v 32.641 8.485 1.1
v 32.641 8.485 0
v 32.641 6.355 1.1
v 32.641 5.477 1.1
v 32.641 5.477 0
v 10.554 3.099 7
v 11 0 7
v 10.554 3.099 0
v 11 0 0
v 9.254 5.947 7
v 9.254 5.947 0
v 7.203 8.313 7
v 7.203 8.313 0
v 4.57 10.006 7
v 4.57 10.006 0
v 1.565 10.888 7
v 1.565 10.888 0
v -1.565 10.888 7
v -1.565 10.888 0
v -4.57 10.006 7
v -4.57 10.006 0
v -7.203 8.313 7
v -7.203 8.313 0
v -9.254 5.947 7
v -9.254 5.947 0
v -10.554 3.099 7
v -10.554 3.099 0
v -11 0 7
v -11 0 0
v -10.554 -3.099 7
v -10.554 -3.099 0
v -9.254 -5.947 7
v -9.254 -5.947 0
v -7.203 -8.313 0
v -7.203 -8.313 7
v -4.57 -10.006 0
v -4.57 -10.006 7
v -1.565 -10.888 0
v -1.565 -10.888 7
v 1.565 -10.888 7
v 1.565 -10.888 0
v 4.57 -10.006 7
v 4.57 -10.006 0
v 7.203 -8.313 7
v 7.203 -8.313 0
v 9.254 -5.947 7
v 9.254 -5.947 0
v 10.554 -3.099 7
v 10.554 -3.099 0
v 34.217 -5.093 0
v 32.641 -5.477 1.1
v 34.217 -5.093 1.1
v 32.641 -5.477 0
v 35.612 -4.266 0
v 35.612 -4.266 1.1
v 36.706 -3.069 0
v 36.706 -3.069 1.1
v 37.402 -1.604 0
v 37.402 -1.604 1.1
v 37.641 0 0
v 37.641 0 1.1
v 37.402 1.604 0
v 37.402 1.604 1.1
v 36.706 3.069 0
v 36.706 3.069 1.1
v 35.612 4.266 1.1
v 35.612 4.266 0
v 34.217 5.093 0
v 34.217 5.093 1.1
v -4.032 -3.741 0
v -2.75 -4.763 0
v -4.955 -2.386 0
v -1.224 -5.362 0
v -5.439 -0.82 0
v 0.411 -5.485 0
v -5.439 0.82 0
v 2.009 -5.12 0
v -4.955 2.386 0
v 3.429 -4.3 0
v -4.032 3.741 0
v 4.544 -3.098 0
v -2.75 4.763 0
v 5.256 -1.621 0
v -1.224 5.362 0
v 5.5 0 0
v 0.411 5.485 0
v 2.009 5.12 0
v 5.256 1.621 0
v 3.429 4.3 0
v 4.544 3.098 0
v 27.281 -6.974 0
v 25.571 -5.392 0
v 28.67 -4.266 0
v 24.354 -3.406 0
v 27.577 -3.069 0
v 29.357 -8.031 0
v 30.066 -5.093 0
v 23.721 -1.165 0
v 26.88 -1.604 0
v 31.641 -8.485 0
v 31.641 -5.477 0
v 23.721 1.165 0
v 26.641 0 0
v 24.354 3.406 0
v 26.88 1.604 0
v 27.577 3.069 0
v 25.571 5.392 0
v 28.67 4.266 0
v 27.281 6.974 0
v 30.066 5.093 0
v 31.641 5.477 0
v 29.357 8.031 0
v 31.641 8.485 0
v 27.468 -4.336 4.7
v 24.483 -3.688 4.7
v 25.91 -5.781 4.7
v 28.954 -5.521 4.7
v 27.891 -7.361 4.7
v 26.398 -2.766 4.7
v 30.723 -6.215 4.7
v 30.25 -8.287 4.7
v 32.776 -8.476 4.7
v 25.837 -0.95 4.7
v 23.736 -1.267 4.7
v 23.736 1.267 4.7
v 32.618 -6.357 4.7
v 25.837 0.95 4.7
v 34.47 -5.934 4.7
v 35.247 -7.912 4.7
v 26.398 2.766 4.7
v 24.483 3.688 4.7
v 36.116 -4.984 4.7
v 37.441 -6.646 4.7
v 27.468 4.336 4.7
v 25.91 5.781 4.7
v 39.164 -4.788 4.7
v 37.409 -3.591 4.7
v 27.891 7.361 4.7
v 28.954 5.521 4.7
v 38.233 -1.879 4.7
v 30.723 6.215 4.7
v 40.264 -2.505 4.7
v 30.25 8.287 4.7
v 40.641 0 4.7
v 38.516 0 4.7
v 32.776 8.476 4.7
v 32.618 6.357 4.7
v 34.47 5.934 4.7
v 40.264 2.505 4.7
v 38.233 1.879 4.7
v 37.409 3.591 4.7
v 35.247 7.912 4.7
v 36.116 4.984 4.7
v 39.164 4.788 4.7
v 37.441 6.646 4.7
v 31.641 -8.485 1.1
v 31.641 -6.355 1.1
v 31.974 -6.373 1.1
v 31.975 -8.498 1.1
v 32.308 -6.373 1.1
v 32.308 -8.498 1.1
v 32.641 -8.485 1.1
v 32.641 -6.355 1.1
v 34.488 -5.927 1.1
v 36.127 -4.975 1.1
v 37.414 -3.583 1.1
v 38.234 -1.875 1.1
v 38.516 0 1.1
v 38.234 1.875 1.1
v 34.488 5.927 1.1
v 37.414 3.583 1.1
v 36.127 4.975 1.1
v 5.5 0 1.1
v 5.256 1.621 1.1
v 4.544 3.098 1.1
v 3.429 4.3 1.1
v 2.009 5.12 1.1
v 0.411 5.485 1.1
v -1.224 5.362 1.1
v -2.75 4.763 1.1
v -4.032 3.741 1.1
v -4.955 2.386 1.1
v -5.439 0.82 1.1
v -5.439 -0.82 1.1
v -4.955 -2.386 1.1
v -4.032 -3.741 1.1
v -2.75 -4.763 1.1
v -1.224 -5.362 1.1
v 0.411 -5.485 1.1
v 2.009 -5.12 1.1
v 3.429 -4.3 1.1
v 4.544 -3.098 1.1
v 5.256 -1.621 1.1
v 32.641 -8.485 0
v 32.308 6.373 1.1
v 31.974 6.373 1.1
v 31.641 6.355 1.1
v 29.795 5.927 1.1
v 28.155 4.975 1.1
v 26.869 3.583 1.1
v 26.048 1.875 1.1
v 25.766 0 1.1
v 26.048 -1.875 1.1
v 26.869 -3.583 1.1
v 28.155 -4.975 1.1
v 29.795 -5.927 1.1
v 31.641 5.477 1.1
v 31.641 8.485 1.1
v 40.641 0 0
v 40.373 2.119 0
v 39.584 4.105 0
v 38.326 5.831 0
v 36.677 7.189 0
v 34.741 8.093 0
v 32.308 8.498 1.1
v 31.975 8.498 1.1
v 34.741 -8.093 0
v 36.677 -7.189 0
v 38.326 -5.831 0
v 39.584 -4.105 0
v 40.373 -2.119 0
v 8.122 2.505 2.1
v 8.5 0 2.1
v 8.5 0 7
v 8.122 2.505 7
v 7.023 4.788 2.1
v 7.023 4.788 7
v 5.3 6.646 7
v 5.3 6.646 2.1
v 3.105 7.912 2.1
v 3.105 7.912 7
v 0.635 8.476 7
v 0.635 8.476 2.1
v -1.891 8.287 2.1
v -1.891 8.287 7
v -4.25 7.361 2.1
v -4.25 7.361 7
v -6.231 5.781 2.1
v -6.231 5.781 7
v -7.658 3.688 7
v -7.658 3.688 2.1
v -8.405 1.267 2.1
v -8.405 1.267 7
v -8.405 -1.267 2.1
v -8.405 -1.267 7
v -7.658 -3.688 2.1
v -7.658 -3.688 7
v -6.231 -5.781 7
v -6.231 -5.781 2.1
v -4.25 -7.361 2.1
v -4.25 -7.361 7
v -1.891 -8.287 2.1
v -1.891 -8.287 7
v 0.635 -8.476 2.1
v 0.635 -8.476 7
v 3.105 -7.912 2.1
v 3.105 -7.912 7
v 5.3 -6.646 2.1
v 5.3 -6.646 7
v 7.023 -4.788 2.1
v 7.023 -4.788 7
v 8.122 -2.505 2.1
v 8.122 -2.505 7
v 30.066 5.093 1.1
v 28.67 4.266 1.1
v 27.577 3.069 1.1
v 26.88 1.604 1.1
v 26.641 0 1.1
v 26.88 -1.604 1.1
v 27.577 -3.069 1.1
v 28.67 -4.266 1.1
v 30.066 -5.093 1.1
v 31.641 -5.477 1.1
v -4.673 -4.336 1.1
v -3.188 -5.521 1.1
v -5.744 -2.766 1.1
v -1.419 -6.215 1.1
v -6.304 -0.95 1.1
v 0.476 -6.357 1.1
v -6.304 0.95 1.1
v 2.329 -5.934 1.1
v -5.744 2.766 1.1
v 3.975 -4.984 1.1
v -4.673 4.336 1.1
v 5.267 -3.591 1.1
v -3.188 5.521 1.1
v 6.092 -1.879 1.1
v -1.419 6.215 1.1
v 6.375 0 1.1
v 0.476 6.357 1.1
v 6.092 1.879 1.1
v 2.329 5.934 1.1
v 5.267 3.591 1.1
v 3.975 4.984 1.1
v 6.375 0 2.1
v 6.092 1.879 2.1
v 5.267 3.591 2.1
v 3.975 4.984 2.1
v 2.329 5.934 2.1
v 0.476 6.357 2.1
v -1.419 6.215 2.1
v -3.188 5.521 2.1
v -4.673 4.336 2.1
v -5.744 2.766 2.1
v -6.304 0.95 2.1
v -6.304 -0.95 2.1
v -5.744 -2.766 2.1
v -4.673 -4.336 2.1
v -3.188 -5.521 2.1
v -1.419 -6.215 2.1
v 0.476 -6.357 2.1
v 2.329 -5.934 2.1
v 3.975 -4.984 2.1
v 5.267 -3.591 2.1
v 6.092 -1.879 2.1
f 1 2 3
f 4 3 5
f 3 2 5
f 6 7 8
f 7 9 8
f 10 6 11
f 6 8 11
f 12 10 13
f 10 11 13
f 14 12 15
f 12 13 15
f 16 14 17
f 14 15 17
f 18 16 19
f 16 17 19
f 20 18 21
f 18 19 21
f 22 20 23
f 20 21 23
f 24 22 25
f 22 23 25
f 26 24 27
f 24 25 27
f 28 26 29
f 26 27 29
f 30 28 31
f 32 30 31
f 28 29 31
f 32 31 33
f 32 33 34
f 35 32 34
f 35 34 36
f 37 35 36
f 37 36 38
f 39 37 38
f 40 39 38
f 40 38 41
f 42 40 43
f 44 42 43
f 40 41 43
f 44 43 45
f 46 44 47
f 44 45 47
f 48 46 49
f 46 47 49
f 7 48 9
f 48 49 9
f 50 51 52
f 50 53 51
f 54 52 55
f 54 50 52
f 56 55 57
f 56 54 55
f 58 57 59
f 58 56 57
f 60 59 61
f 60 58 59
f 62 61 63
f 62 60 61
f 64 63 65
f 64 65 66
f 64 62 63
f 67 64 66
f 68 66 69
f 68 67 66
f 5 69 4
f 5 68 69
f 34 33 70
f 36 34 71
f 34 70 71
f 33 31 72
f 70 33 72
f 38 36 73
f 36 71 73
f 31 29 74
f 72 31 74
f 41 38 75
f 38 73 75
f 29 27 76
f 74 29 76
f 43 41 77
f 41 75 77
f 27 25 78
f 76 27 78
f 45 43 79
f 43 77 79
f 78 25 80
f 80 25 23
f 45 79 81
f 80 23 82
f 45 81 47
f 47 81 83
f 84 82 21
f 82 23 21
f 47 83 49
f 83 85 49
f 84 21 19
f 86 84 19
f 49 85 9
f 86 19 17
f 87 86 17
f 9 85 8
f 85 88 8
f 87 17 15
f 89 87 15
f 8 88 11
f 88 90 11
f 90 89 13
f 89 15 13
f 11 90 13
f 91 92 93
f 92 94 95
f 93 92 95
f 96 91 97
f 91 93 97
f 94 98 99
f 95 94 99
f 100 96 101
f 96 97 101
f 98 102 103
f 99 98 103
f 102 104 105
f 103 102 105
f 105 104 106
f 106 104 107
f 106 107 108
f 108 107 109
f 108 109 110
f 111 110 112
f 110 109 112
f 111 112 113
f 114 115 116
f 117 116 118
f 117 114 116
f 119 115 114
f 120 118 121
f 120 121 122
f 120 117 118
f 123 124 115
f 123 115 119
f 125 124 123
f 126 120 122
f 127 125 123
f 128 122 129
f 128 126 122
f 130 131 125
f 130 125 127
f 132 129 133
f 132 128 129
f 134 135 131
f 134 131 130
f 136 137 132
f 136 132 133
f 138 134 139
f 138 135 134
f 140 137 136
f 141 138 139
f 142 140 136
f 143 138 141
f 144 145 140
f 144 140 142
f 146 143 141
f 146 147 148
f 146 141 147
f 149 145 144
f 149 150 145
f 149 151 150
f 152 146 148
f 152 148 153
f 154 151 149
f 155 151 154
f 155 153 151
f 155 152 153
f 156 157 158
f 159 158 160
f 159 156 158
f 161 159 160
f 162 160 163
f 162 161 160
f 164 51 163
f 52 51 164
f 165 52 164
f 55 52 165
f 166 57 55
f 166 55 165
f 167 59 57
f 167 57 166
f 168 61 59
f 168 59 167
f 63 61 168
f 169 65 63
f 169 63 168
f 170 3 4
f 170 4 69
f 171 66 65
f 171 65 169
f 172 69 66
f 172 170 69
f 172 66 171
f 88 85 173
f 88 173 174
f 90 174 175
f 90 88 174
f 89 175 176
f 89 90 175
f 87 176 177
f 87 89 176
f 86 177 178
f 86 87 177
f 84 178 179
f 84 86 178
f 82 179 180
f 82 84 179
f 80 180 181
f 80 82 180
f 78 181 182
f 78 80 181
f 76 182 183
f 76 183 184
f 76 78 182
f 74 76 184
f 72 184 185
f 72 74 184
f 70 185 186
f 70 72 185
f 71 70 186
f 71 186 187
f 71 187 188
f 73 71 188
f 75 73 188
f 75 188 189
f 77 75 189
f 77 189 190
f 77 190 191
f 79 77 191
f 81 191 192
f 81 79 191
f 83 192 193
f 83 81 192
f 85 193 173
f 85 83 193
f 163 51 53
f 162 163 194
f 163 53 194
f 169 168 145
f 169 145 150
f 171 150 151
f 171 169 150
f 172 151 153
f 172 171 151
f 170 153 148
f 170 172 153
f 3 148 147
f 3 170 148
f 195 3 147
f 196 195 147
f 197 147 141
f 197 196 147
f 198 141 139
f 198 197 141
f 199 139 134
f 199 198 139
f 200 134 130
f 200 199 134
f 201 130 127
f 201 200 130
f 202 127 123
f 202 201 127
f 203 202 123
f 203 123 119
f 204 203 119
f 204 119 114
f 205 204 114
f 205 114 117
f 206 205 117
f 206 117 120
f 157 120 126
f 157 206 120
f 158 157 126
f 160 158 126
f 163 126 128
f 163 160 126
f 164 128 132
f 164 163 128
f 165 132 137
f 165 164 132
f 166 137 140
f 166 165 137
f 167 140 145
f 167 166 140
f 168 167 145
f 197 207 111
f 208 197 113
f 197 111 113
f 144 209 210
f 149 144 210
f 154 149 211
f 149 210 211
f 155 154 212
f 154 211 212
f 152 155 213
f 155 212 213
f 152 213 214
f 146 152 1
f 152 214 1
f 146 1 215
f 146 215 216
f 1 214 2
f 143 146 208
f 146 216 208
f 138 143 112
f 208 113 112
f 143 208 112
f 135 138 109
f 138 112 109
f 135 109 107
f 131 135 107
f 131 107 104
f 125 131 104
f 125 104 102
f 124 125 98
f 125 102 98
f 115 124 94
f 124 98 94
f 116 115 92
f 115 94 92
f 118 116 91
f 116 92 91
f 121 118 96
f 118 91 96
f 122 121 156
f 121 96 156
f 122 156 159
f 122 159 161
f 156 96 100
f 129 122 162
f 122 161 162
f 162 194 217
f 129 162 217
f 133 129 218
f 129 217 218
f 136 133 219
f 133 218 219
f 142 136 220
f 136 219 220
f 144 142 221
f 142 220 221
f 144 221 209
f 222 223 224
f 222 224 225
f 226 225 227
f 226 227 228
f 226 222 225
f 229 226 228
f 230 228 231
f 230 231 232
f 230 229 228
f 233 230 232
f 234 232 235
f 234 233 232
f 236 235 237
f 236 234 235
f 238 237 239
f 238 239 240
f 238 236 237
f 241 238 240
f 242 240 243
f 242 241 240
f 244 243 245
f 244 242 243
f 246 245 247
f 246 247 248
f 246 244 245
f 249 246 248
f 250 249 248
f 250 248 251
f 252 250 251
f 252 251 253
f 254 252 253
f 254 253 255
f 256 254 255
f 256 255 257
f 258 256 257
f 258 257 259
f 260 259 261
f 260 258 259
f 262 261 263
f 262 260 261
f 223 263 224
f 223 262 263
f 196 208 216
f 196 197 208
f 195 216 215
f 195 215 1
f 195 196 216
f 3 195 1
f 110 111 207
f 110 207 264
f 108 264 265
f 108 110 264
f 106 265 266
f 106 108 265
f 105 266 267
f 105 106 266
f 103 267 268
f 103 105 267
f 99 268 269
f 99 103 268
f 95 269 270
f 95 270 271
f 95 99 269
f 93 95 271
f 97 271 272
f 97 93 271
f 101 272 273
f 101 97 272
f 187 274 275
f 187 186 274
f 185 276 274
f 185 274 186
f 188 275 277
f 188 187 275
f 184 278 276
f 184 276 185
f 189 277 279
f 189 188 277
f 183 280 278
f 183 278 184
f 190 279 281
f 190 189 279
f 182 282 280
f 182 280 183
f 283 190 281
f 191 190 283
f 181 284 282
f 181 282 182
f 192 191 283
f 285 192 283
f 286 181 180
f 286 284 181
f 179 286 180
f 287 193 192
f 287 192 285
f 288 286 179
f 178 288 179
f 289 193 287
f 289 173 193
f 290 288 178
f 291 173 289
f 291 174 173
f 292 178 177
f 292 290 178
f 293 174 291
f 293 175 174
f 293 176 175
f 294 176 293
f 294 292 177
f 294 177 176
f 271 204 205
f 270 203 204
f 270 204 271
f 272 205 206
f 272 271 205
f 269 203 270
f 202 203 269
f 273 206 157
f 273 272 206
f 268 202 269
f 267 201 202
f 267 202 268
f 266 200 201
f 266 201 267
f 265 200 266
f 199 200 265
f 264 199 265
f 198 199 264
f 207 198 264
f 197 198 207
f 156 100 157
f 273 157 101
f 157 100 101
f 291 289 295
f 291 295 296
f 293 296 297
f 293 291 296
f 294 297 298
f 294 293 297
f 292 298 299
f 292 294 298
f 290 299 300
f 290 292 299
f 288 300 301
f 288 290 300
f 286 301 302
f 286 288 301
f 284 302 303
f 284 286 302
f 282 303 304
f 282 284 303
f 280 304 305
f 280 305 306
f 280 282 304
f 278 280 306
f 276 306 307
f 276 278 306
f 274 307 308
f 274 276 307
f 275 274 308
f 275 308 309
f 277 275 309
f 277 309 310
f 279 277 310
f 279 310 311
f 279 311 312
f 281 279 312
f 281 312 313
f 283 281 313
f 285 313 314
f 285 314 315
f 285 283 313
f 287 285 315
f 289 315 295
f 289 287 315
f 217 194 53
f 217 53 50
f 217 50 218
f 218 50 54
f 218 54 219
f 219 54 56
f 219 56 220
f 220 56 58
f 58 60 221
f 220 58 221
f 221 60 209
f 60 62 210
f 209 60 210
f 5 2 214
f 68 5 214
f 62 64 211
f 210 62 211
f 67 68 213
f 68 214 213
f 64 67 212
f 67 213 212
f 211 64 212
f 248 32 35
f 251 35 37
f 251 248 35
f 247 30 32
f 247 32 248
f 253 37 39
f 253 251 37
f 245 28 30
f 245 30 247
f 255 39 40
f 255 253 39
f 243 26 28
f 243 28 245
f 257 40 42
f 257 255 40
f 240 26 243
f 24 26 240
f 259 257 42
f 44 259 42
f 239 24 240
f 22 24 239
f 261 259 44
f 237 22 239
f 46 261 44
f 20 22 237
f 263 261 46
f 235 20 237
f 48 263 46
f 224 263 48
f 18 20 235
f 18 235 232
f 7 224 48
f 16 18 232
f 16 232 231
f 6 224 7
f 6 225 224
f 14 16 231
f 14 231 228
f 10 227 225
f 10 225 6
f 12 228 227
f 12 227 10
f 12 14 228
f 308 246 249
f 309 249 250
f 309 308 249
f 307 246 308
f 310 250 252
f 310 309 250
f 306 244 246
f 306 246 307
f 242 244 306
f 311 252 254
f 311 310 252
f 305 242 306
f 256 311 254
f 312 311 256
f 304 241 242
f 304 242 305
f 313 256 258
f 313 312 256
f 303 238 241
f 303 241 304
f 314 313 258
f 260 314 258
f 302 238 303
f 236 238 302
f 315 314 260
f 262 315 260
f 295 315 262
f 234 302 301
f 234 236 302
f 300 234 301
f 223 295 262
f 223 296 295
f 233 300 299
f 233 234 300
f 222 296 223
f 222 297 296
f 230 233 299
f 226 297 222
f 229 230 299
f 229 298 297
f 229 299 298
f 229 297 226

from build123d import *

# Parameters (mm, degrees)
F0_R      = 11
F0_R_2    = 5.5
F1_DEPTH  = 1.1
F2_R      = 11
F2_R_2    = 6.375
F3_DEPTH  = 1
F4_R      = 11
F4_R_2    = 8.5
F5_DEPTH  = 4.9
F6_R      = 8.5
F6_R_2    = 5.5
F7_DEPTH  = 1.1
F8_R      = 8.5
F8_R_2    = 6.375
F9_DEPTH  = 3.6
F11_DEPTH = 1.1


with BuildPart() as f1:
    # F0 (on Top) → F1 (new body)
    with BuildSketch(Plane.XY):
        Circle(F0_R)
        Circle(F0_R_2, mode=Mode.SUBTRACT)
    extrude(amount=F1_DEPTH)

    # F2 (on face) → F3 (join)
    with BuildSketch(Plane.XY.offset(1.1)):
        Circle(F2_R)
        Circle(F2_R_2, mode=Mode.SUBTRACT)
    extrude(amount=F3_DEPTH)

    # F4 (on face) → F5 (join)
    with BuildSketch(Plane.XY.offset(2.1)):
        Circle(F4_R)
        Circle(F4_R_2, mode=Mode.SUBTRACT)
    extrude(amount=F5_DEPTH)


with BuildPart() as f7:
    # F6 (on Top) → F7 (new body)
    with BuildSketch(Plane.XY):
        with Locations((32.1412831545, 0)):
            Circle(F6_R)
        with Locations((32.1412831545, 0)):
            Circle(F6_R_2, mode=Mode.SUBTRACT)
    extrude(amount=F7_DEPTH)

    # F8 (on face) → F9 (join)
    with BuildSketch(Plane.XY.offset(1.1)):
        with Locations((32.1412831545, 0)):
            Circle(F8_R)
        with Locations((32.1412831545, 0)):
            Circle(F8_R_2, mode=Mode.SUBTRACT)
    extrude(amount=F9_DEPTH)

    # F10 (on face) → F11 (cut)
    with BuildSketch(Plane(origin=(0, 0, 0), x_dir=(1, 0, 0), z_dir=(0, 0, -1))):
        with BuildLine():
            ThreePointArc((31.6412831545, 5.4772255751), (32.1412831545, 5.5), (32.6412831545, 5.4772255751))
            Line((32.6412831545, 5.4772255751), (32.6412831545, 8.4852813742))
            ThreePointArc((32.6412831545, 8.4852813742), (32.1412831545, 8.5), (31.6412831545, 8.4852813742))
            Line((31.6412831545, 8.4852813742), (31.6412831545, 5.4772255751))
        make_face()
        with BuildLine():
            Line((32.6412831545, -8.4852813742), (32.6412831545, -5.4772255751))
            ThreePointArc((32.6412831545, -5.4772255751), (32.1412831545, -5.5), (31.6412831545, -5.4772255751))
            Line((31.6412831545, -5.4772255751), (31.6412831545, -8.4852813742))
            ThreePointArc((31.6412831545, -8.4852813742), (32.1412831545, -8.5), (32.6412831545, -8.4852813742))
        make_face()
    extrude(amount=-F11_DEPTH, mode=Mode.SUBTRACT)


solid = Compound([f1.part, f7.part])
